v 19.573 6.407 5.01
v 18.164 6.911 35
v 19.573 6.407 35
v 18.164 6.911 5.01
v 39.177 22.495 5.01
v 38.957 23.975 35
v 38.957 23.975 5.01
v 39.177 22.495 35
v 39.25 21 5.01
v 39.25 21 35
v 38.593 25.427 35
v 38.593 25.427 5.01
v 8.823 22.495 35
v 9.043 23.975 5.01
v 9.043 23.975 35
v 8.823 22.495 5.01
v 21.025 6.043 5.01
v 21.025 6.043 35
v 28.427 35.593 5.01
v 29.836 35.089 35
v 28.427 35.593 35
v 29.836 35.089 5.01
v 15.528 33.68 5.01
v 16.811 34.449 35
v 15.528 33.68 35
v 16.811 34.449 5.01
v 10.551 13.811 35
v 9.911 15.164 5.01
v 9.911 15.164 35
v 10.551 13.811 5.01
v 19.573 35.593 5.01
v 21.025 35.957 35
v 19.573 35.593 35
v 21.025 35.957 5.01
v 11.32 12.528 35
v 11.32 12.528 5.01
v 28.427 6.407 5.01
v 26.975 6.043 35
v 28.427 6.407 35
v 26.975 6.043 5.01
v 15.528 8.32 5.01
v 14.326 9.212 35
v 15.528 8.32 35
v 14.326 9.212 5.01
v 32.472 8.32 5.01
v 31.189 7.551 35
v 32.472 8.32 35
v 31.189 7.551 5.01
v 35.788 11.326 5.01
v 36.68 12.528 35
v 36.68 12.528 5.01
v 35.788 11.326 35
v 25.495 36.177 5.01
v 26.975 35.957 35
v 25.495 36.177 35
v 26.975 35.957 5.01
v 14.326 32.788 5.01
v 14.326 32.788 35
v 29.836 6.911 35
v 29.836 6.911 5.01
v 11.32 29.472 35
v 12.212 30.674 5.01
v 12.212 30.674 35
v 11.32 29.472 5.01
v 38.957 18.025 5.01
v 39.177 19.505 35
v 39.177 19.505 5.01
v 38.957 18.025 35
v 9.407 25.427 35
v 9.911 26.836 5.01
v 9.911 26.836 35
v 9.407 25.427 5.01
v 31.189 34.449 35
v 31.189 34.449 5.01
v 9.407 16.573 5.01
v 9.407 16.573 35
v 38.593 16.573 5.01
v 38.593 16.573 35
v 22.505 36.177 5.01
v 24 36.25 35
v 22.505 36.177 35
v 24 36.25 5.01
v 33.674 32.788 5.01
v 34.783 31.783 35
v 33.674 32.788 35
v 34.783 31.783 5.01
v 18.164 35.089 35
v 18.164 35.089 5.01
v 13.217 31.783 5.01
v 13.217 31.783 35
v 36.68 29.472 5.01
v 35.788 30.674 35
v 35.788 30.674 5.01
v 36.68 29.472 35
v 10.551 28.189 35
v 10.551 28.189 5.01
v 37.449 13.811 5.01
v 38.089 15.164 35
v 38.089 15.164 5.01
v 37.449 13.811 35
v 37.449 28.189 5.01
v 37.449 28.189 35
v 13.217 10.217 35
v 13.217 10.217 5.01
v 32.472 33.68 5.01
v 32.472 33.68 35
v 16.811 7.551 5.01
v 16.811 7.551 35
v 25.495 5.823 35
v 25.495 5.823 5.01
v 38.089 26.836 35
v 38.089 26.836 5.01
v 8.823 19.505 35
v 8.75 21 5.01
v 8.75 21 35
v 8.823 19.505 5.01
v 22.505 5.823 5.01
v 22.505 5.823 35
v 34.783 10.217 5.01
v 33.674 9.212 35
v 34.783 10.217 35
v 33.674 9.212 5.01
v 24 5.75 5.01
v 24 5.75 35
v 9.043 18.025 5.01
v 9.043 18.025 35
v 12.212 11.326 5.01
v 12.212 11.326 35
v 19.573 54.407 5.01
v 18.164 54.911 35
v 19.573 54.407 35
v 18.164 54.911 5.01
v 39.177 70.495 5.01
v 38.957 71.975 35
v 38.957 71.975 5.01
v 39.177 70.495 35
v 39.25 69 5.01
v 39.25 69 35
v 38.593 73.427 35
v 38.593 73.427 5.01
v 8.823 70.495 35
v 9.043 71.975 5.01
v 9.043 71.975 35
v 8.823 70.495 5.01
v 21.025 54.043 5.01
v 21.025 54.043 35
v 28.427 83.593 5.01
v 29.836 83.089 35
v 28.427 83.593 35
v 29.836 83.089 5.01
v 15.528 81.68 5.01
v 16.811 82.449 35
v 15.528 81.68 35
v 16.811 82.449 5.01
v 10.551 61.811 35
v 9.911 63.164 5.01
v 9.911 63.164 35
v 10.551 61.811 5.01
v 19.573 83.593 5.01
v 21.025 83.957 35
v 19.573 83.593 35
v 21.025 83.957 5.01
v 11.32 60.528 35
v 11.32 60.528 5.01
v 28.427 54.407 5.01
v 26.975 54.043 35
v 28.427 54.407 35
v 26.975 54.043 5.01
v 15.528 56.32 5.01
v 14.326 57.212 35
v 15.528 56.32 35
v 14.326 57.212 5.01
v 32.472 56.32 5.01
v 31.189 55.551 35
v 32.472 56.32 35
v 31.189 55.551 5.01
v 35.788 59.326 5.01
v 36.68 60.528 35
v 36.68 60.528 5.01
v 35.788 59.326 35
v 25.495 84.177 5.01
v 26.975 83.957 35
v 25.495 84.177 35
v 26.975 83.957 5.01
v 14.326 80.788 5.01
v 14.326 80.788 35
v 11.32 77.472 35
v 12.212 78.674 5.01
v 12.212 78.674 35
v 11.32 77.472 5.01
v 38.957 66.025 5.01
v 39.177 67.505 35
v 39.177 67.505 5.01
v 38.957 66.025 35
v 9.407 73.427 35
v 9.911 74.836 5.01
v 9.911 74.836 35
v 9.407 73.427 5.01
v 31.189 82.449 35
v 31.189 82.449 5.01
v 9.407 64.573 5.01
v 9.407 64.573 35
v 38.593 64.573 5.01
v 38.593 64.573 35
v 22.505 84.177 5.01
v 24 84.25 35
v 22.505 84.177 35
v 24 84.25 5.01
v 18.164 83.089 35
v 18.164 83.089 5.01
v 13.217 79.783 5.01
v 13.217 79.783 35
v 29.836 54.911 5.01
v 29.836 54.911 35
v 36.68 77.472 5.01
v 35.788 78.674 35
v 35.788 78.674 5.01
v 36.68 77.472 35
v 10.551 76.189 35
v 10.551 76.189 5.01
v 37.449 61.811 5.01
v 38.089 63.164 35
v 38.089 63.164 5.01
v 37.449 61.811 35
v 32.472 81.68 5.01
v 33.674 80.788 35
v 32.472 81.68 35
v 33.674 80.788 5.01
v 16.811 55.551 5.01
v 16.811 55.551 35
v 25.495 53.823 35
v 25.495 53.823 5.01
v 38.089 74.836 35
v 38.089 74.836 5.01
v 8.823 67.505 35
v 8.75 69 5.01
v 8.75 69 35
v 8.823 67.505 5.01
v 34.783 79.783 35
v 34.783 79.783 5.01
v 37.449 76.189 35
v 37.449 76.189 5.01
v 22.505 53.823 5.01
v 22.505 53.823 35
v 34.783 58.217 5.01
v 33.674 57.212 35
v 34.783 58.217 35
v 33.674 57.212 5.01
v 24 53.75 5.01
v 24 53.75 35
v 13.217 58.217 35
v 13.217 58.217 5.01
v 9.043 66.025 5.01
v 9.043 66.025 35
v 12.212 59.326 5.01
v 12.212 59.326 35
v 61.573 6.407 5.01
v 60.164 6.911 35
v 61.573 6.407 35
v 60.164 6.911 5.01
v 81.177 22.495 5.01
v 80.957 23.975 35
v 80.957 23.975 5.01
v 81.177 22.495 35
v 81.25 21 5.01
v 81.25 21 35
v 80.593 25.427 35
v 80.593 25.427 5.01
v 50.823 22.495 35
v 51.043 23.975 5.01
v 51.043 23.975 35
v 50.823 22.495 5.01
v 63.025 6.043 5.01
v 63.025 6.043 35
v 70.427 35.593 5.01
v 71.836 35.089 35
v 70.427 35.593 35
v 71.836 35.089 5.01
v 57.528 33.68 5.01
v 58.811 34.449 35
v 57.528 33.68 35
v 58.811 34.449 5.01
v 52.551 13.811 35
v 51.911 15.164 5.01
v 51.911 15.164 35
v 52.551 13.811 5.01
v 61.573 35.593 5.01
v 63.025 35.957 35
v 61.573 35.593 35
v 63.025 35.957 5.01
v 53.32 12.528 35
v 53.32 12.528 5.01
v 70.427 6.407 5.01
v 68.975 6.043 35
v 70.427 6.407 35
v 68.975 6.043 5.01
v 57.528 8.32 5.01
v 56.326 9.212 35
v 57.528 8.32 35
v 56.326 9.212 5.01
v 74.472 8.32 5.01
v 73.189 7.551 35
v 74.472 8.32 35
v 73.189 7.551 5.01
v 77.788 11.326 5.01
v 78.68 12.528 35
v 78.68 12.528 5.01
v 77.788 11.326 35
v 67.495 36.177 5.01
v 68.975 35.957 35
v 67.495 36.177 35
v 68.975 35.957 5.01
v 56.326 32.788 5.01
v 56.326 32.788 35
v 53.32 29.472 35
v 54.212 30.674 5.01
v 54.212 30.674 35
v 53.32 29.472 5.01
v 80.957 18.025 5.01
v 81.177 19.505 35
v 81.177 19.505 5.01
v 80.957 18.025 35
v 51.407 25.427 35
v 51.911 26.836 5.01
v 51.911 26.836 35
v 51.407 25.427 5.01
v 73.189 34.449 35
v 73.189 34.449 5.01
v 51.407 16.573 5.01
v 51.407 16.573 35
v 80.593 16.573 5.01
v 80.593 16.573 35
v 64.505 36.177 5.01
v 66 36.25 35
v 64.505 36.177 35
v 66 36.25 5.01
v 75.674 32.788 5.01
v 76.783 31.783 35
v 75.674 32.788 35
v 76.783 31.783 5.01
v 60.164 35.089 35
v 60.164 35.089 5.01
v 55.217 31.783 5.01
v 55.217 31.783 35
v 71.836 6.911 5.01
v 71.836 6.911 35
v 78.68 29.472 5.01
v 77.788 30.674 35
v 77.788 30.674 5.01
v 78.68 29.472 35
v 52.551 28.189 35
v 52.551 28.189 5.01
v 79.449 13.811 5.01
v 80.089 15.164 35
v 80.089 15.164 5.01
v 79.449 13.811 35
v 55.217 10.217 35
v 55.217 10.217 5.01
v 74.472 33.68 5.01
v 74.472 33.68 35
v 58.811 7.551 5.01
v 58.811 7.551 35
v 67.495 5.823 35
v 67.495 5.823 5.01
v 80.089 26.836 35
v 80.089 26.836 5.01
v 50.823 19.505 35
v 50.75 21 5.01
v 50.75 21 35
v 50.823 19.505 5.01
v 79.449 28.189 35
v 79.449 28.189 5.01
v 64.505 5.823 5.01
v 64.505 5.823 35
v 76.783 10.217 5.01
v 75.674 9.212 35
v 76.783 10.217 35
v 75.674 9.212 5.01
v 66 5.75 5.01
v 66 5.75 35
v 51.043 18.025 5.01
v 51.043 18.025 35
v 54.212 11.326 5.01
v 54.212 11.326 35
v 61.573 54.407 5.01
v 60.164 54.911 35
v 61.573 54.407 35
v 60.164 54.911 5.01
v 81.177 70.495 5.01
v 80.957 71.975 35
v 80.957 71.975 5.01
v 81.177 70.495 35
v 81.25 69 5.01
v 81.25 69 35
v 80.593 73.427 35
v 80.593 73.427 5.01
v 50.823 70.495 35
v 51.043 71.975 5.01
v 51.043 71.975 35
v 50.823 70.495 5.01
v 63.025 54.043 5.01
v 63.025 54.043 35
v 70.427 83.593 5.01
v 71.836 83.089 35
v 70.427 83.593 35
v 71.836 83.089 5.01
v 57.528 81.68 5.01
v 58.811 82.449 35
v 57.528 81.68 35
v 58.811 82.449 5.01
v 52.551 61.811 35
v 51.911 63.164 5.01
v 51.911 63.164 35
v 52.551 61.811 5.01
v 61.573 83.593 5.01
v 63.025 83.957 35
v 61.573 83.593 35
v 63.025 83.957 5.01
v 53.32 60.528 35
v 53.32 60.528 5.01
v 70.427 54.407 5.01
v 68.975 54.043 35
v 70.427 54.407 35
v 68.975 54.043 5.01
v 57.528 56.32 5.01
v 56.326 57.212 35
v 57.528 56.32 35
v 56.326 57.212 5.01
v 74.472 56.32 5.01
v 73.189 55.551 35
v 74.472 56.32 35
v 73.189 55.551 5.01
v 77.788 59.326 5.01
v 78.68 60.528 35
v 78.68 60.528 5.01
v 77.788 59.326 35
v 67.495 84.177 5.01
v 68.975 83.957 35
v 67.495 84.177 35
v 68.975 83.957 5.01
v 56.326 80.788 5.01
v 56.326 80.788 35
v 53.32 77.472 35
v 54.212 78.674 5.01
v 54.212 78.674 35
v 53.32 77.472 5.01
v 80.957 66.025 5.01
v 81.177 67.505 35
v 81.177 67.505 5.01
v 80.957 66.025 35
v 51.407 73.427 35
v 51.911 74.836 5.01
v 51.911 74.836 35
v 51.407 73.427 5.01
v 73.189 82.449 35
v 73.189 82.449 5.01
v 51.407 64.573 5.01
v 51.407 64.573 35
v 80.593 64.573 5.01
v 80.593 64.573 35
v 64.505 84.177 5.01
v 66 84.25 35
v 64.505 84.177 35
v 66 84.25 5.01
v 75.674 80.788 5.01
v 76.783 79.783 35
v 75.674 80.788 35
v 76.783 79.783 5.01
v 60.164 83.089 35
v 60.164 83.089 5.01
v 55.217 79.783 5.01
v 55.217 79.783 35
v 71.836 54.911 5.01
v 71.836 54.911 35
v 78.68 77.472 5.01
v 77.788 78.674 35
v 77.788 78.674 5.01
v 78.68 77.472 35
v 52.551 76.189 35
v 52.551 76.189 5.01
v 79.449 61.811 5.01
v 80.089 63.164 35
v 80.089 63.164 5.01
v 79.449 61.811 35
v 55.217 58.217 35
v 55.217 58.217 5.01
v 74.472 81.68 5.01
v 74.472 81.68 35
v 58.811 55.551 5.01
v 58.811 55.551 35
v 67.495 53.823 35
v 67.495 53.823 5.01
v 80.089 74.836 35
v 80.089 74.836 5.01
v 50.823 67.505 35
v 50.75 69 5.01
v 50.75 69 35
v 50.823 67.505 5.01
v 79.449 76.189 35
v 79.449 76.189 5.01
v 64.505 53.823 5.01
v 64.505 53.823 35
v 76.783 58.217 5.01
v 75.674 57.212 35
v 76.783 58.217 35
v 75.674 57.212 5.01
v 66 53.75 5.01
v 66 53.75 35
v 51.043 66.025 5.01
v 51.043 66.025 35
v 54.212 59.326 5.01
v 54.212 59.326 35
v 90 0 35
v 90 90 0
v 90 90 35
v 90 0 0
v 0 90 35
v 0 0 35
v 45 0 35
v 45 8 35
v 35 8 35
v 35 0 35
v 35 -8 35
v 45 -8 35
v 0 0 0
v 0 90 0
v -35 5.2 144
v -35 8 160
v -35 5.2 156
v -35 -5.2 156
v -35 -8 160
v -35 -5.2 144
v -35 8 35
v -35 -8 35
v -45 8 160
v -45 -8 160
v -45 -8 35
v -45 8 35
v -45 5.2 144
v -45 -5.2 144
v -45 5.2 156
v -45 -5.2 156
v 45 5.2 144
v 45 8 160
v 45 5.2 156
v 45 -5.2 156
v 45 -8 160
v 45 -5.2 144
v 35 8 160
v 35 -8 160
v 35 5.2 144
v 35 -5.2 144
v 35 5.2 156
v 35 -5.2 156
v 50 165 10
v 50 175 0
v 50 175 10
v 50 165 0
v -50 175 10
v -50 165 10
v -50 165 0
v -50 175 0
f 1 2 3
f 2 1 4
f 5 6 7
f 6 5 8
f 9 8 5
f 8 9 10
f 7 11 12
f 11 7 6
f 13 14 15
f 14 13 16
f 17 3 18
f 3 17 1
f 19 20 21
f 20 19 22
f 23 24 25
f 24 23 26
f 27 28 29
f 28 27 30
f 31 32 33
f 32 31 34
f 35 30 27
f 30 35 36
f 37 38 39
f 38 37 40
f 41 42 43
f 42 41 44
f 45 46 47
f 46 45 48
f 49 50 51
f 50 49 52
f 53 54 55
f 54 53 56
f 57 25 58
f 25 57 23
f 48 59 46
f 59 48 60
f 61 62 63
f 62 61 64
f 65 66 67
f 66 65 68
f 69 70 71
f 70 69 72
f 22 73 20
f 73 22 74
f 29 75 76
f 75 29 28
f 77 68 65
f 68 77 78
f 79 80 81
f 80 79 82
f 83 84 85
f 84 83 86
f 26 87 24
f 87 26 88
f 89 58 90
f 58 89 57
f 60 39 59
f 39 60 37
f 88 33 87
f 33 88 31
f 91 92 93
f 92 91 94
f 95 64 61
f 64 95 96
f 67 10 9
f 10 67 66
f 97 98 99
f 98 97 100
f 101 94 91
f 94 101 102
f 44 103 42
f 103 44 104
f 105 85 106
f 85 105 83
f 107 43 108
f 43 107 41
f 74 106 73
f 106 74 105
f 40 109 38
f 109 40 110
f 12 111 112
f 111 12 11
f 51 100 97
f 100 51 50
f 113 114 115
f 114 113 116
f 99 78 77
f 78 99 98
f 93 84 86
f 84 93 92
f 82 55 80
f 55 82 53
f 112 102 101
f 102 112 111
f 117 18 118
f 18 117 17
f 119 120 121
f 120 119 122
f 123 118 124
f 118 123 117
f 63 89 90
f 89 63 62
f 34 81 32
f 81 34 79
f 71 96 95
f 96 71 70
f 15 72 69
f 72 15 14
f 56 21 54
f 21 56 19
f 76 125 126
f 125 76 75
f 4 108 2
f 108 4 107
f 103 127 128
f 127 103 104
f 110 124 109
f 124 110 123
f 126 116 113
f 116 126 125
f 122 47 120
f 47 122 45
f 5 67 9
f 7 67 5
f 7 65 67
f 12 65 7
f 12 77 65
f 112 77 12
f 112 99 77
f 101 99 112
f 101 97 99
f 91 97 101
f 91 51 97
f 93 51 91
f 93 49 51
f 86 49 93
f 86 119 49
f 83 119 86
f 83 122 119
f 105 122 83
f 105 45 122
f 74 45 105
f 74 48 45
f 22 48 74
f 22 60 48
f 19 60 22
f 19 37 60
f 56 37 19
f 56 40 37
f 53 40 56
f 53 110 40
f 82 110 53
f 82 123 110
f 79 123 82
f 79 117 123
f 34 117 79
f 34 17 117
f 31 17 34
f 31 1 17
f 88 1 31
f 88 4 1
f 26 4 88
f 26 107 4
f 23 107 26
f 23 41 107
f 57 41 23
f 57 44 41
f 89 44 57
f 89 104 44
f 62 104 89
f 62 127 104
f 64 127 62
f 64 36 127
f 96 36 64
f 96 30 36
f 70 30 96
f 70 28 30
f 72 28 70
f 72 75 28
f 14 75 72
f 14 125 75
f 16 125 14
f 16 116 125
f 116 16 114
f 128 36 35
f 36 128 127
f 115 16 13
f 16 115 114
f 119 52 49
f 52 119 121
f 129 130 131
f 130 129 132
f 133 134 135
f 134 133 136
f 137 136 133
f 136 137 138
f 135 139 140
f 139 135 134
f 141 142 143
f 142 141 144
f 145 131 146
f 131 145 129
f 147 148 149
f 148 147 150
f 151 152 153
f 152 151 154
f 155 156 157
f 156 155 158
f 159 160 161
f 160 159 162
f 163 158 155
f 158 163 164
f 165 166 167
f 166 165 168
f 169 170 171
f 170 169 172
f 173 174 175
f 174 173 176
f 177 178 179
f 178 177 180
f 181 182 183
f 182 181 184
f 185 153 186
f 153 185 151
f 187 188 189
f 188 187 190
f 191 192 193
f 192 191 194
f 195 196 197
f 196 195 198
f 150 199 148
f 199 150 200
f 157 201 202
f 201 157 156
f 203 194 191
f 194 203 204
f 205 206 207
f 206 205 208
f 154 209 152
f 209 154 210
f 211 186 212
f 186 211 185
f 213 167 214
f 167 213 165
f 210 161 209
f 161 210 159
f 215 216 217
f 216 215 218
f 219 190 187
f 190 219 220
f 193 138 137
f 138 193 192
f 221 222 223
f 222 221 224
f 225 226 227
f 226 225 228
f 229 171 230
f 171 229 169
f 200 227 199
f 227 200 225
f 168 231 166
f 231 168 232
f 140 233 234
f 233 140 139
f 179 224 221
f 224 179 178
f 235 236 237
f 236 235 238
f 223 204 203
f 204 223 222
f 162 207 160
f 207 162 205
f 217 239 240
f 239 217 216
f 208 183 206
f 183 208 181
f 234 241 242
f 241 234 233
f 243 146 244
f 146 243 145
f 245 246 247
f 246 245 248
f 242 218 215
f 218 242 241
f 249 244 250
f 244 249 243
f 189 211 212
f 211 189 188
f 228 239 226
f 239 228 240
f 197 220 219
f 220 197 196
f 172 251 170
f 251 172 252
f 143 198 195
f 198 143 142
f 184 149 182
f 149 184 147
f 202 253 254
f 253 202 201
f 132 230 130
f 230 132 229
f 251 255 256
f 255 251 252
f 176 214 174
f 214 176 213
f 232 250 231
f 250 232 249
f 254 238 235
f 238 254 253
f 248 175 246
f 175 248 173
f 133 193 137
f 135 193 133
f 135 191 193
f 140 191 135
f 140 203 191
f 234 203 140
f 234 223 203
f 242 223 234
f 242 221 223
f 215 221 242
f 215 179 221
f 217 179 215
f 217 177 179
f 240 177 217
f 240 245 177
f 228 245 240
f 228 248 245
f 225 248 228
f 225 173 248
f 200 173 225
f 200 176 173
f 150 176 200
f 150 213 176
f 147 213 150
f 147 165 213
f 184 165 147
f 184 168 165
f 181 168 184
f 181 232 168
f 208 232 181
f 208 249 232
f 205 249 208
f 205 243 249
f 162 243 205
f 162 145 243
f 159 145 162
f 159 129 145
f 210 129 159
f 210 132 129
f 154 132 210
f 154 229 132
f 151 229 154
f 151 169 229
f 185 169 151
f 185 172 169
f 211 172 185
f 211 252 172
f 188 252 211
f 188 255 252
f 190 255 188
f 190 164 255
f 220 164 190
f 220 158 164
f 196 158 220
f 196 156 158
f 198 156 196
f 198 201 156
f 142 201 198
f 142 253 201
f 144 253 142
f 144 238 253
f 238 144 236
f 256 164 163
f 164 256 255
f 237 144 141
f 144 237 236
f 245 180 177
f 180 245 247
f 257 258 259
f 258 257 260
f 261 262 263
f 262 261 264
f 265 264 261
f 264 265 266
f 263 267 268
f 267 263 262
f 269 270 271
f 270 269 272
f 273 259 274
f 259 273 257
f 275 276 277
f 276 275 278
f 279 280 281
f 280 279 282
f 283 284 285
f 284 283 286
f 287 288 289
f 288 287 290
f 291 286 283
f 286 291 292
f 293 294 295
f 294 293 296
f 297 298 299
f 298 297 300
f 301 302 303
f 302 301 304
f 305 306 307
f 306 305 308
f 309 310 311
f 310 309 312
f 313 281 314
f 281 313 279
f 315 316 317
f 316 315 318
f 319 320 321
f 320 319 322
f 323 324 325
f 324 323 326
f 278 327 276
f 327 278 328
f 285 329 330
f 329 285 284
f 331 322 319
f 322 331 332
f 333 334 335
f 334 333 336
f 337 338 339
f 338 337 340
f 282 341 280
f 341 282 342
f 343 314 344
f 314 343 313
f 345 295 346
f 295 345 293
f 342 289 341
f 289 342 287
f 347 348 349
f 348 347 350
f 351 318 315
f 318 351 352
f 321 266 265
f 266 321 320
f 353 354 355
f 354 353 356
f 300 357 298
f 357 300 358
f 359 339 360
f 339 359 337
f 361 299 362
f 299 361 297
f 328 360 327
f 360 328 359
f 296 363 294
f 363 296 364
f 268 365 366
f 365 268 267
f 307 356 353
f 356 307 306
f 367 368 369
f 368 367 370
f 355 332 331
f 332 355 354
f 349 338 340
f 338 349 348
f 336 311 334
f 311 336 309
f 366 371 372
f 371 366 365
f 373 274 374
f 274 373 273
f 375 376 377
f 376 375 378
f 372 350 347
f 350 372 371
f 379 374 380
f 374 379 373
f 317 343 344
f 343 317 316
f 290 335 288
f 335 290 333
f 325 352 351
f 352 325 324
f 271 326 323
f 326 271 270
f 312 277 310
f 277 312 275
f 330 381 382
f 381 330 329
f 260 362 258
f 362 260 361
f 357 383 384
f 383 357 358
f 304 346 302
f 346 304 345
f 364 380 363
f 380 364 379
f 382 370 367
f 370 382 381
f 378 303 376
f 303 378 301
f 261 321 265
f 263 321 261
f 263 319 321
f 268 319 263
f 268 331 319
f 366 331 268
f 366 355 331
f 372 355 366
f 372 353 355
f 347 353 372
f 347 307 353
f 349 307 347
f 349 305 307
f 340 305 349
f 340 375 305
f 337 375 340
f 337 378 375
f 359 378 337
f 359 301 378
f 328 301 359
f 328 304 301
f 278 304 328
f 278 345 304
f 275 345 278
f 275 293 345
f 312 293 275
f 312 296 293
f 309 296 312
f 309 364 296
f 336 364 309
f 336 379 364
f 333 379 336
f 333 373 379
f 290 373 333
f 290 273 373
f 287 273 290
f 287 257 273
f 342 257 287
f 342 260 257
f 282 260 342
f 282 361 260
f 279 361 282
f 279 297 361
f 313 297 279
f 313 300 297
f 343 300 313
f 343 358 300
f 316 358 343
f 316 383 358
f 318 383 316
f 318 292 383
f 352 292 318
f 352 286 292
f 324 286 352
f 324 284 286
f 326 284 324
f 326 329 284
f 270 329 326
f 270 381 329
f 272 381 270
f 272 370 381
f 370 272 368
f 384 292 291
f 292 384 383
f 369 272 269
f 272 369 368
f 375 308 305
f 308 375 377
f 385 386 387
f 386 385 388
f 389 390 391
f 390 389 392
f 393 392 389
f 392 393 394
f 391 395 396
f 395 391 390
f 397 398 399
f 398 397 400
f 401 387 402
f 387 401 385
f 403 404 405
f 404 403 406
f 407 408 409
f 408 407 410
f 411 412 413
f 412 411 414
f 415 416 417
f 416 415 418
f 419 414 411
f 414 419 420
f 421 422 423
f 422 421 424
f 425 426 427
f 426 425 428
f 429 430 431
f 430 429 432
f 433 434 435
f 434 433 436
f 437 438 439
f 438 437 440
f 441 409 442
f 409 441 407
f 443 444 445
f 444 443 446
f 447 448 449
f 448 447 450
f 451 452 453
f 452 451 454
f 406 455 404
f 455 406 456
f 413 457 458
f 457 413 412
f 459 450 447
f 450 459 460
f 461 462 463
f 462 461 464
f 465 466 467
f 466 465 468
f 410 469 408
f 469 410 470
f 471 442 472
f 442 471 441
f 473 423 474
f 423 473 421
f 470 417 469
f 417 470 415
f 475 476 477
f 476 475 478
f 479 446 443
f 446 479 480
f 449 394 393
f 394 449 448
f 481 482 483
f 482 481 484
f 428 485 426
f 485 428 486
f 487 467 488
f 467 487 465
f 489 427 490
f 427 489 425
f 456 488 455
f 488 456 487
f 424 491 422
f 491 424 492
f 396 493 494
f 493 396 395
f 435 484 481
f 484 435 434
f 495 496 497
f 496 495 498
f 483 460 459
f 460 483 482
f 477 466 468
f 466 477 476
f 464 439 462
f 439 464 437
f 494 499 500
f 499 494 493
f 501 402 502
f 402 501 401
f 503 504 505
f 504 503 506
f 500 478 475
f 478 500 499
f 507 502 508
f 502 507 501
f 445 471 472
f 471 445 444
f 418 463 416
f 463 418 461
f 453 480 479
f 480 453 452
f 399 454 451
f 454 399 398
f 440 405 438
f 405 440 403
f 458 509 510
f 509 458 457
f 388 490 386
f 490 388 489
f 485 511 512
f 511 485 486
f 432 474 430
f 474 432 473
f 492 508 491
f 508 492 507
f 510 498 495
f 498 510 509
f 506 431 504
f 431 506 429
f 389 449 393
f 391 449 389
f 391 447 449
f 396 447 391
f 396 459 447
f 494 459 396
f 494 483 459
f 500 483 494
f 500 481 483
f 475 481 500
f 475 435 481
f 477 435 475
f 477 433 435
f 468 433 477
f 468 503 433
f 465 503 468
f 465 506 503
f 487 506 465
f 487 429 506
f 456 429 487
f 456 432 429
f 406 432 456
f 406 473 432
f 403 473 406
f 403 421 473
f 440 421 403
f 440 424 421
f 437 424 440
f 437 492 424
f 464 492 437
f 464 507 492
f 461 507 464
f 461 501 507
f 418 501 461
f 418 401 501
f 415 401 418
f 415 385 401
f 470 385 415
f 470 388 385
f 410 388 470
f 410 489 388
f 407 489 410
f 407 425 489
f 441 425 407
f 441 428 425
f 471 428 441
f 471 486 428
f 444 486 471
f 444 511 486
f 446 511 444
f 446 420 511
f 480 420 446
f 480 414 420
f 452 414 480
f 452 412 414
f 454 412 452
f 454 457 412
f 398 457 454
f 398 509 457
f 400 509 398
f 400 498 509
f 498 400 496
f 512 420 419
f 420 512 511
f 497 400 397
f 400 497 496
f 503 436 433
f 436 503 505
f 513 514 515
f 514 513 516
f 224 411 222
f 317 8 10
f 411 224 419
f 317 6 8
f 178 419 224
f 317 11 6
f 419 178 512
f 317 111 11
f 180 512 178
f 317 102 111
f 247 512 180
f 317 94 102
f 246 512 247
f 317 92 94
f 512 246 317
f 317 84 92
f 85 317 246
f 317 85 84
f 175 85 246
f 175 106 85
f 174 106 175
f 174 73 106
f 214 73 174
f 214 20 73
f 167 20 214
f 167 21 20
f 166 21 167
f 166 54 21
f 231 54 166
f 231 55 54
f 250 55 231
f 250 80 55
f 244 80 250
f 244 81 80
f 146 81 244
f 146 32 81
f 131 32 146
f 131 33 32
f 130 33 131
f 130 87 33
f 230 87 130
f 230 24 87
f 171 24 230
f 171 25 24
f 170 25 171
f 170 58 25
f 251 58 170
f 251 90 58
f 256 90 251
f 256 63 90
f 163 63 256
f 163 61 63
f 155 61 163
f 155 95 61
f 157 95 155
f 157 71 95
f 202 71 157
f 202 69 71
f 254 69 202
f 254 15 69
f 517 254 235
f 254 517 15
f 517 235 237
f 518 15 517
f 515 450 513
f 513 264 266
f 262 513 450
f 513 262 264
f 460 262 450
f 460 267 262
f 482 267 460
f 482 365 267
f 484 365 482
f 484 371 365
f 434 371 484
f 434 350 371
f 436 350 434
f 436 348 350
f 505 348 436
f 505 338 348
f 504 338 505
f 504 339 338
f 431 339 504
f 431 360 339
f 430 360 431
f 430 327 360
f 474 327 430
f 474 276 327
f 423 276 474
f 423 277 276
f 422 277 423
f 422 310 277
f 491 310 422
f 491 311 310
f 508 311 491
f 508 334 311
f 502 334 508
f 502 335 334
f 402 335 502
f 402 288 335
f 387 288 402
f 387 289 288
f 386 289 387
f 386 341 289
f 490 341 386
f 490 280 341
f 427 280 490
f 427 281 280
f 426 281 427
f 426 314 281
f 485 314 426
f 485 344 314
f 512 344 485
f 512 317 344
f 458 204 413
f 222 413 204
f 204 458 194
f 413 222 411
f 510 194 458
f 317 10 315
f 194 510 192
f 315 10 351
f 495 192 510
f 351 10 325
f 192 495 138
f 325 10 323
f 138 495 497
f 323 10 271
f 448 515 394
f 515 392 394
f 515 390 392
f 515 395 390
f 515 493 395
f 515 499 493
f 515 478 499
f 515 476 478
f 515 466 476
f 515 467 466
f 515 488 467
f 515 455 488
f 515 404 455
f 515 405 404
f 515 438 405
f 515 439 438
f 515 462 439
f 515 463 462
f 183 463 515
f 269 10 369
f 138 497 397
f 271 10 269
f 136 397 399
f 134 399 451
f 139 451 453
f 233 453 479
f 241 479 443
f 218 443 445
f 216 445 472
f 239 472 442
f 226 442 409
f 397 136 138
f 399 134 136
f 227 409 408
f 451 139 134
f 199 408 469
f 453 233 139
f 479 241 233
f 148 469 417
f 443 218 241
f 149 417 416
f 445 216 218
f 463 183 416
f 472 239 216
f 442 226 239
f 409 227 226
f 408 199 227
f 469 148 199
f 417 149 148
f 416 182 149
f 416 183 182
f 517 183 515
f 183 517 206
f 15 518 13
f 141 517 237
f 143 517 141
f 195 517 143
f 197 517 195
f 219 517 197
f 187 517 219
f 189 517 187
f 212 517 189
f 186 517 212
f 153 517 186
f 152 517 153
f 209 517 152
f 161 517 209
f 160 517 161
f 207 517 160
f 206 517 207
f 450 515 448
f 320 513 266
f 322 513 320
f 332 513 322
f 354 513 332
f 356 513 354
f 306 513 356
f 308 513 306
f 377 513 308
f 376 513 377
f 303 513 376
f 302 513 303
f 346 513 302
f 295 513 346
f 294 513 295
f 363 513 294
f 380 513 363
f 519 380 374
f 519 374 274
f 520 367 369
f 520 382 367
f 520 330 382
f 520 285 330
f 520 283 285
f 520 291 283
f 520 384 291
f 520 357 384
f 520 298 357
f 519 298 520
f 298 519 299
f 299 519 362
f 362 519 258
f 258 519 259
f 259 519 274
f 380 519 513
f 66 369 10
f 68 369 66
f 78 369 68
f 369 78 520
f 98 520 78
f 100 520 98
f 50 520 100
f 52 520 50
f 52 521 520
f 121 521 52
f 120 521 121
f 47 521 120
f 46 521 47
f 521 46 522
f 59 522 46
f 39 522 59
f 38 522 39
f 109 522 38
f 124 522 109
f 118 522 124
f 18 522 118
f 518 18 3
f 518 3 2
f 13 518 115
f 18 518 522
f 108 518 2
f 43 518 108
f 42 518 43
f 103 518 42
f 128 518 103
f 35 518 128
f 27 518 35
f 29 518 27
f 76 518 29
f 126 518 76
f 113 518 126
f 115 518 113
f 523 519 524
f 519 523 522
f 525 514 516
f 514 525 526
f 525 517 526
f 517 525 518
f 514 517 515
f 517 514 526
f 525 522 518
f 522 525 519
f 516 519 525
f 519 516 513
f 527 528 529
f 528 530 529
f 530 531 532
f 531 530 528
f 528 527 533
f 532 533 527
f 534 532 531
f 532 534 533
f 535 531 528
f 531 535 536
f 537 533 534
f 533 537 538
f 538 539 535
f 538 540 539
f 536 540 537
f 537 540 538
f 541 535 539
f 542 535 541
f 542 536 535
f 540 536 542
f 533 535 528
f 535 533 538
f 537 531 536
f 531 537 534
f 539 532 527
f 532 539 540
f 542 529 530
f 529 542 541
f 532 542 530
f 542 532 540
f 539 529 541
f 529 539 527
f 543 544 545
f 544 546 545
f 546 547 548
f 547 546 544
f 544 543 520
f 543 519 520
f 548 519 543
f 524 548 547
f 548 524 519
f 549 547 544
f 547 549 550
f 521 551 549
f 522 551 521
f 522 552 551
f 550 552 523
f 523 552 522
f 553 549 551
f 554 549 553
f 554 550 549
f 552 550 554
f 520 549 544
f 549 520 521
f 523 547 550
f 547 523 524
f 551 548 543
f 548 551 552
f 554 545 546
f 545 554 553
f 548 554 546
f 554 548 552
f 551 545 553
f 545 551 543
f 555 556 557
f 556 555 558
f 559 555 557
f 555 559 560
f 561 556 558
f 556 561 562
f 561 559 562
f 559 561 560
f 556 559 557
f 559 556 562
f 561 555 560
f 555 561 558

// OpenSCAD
// --- Dimensions ---
// Part 1: Base Block
base_width = 90;          // X dimension of base
base_depth = 90;          // Y dimension of base
base_height = 35;         // Z dimension of base

// Tube Seats (Blind holes)
seat_dia = 30.5;          // Diameter of tube seats
seat_depth = 30;          // Depth of the seat cut
seat_floor = 5;           // Remaining floor thickness (35 - 30)
seat_x_pos = [ -21, 21 ]; // X coordinates of seats
seat_y_pos = [ -24, 24 ]; // Y coordinates of seats

// Posts
post_thickness = 10;      // X dimension of posts
post_width = 16;          // Y dimension of posts
post_height = 125;        // Z height of posts (160 - 35)
post_hole_size = 10.4;    // Square hole dimension (X-axis through-hole)
post_hole_z_abs = 150;    // Absolute Z center of the hole

// Part 2: Handle
handle_width = 10;        // X dimension of handle
handle_depth = 10;        // Y dimension of handle
handle_length = 100;      // X dimension of handle
handle_y_start = 55;      // Y start position
handle_y_end = 65;        // Y end position

// General
$fn = 64;

// --- Part 1: Base and Posts ---
module part_1() {
    // The entire part 1 must be a single solid body.
    // We use union() to combine the base and the posts.
    union() {
        // Base Block
        difference() {
            // Main block - placed on Z=0
            cube([base_width, base_depth, base_height]);
            
            // Tube Seats (Blind holes)
            // Centered on X/Y, but we must translate to the specific coordinates.
            // Since cube is at origin (0,0,0), center is (45, 45, 17.5).
            // To center seats at seat_x_pos/seat_y_pos, we translate.
            for (i = [0:1]) {
                for (j = [0:1]) {
                    // Translate to seat center. 
                    // We use seat_depth + 0.01 to ensure it cuts through the top face.
                    // The seat is blind, so it stops 5mm from the bottom.
                    translate([
                        (base_width/2) + seat_x_pos[i], 
                        (base_depth/2) + seat_y_pos[j], 
                        base_height - seat_depth + 0.01
                    ])
                        cylinder(d = seat_dia, h = seat_depth + 0.02);
                }
            }
        }

        // Posts
        // Posts stand on the base (Z=35) and rise to Z=160.
        // Post height = 160 - 35 = 125.
        // Post center Z = 35 + (125/2) = 97.5.
        // Post X range: 
        // Post 1: X from -45 to -35 (centered at -40)
        // Post 2: X from 35 to 45 (centered at 40)
        // Post Y range: -8 to 8 (centered at 0)
        
        for (side = [-1, 1]) {
            translate([side * (base_width/2 - post_thickness/2), 0, base_height + post_height/2]) {
                difference() {
                    // Post body
                    cube([post_thickness, post_width, post_height], center = true);
                    
                    // Square hole through X axis
                    // Hole is centered at absolute Z = 150.
                    // Local Z center = 150 - (base_height + post_height/2)
                    // Local Z center = 150 - (35 + 62.5) = 52.5
                    translate([0, 0, 150 - (base_height + post_height/2)])
                        rotate([0, 90, 0])
                            cube([post_thickness + 2, post_hole_size, post_hole_size], center = true);
                }
            }
        }
    }
}

// --- Part 2: Handle ---
module part_2() {
    // Handle: 10x10x100. Lying on bed (Z=0 to 10).
    // Centered on X=0. Spans Y=55 to 65.
    // X range is -50 to 50.
    translate([0, 60, 5])
        cube([handle_length, handle_depth, handle_width], center = true);
}

// --- Rendering ---
// Part 1: Centered on origin in X and Y.
// To ensure it rests on Z=0, we don't need to translate if we don't use center=true for the base.
// However, to keep the code clean, I'll use the logic in part_1.
part_1();

// Part 2: Placed side by side.
// Part 1 Y max is 45. Part 2 Y is 55 to 65.
// To avoid collision and ensure they are "side by side" for printing:
translate([0, 110, 0]) 
    part_2();
